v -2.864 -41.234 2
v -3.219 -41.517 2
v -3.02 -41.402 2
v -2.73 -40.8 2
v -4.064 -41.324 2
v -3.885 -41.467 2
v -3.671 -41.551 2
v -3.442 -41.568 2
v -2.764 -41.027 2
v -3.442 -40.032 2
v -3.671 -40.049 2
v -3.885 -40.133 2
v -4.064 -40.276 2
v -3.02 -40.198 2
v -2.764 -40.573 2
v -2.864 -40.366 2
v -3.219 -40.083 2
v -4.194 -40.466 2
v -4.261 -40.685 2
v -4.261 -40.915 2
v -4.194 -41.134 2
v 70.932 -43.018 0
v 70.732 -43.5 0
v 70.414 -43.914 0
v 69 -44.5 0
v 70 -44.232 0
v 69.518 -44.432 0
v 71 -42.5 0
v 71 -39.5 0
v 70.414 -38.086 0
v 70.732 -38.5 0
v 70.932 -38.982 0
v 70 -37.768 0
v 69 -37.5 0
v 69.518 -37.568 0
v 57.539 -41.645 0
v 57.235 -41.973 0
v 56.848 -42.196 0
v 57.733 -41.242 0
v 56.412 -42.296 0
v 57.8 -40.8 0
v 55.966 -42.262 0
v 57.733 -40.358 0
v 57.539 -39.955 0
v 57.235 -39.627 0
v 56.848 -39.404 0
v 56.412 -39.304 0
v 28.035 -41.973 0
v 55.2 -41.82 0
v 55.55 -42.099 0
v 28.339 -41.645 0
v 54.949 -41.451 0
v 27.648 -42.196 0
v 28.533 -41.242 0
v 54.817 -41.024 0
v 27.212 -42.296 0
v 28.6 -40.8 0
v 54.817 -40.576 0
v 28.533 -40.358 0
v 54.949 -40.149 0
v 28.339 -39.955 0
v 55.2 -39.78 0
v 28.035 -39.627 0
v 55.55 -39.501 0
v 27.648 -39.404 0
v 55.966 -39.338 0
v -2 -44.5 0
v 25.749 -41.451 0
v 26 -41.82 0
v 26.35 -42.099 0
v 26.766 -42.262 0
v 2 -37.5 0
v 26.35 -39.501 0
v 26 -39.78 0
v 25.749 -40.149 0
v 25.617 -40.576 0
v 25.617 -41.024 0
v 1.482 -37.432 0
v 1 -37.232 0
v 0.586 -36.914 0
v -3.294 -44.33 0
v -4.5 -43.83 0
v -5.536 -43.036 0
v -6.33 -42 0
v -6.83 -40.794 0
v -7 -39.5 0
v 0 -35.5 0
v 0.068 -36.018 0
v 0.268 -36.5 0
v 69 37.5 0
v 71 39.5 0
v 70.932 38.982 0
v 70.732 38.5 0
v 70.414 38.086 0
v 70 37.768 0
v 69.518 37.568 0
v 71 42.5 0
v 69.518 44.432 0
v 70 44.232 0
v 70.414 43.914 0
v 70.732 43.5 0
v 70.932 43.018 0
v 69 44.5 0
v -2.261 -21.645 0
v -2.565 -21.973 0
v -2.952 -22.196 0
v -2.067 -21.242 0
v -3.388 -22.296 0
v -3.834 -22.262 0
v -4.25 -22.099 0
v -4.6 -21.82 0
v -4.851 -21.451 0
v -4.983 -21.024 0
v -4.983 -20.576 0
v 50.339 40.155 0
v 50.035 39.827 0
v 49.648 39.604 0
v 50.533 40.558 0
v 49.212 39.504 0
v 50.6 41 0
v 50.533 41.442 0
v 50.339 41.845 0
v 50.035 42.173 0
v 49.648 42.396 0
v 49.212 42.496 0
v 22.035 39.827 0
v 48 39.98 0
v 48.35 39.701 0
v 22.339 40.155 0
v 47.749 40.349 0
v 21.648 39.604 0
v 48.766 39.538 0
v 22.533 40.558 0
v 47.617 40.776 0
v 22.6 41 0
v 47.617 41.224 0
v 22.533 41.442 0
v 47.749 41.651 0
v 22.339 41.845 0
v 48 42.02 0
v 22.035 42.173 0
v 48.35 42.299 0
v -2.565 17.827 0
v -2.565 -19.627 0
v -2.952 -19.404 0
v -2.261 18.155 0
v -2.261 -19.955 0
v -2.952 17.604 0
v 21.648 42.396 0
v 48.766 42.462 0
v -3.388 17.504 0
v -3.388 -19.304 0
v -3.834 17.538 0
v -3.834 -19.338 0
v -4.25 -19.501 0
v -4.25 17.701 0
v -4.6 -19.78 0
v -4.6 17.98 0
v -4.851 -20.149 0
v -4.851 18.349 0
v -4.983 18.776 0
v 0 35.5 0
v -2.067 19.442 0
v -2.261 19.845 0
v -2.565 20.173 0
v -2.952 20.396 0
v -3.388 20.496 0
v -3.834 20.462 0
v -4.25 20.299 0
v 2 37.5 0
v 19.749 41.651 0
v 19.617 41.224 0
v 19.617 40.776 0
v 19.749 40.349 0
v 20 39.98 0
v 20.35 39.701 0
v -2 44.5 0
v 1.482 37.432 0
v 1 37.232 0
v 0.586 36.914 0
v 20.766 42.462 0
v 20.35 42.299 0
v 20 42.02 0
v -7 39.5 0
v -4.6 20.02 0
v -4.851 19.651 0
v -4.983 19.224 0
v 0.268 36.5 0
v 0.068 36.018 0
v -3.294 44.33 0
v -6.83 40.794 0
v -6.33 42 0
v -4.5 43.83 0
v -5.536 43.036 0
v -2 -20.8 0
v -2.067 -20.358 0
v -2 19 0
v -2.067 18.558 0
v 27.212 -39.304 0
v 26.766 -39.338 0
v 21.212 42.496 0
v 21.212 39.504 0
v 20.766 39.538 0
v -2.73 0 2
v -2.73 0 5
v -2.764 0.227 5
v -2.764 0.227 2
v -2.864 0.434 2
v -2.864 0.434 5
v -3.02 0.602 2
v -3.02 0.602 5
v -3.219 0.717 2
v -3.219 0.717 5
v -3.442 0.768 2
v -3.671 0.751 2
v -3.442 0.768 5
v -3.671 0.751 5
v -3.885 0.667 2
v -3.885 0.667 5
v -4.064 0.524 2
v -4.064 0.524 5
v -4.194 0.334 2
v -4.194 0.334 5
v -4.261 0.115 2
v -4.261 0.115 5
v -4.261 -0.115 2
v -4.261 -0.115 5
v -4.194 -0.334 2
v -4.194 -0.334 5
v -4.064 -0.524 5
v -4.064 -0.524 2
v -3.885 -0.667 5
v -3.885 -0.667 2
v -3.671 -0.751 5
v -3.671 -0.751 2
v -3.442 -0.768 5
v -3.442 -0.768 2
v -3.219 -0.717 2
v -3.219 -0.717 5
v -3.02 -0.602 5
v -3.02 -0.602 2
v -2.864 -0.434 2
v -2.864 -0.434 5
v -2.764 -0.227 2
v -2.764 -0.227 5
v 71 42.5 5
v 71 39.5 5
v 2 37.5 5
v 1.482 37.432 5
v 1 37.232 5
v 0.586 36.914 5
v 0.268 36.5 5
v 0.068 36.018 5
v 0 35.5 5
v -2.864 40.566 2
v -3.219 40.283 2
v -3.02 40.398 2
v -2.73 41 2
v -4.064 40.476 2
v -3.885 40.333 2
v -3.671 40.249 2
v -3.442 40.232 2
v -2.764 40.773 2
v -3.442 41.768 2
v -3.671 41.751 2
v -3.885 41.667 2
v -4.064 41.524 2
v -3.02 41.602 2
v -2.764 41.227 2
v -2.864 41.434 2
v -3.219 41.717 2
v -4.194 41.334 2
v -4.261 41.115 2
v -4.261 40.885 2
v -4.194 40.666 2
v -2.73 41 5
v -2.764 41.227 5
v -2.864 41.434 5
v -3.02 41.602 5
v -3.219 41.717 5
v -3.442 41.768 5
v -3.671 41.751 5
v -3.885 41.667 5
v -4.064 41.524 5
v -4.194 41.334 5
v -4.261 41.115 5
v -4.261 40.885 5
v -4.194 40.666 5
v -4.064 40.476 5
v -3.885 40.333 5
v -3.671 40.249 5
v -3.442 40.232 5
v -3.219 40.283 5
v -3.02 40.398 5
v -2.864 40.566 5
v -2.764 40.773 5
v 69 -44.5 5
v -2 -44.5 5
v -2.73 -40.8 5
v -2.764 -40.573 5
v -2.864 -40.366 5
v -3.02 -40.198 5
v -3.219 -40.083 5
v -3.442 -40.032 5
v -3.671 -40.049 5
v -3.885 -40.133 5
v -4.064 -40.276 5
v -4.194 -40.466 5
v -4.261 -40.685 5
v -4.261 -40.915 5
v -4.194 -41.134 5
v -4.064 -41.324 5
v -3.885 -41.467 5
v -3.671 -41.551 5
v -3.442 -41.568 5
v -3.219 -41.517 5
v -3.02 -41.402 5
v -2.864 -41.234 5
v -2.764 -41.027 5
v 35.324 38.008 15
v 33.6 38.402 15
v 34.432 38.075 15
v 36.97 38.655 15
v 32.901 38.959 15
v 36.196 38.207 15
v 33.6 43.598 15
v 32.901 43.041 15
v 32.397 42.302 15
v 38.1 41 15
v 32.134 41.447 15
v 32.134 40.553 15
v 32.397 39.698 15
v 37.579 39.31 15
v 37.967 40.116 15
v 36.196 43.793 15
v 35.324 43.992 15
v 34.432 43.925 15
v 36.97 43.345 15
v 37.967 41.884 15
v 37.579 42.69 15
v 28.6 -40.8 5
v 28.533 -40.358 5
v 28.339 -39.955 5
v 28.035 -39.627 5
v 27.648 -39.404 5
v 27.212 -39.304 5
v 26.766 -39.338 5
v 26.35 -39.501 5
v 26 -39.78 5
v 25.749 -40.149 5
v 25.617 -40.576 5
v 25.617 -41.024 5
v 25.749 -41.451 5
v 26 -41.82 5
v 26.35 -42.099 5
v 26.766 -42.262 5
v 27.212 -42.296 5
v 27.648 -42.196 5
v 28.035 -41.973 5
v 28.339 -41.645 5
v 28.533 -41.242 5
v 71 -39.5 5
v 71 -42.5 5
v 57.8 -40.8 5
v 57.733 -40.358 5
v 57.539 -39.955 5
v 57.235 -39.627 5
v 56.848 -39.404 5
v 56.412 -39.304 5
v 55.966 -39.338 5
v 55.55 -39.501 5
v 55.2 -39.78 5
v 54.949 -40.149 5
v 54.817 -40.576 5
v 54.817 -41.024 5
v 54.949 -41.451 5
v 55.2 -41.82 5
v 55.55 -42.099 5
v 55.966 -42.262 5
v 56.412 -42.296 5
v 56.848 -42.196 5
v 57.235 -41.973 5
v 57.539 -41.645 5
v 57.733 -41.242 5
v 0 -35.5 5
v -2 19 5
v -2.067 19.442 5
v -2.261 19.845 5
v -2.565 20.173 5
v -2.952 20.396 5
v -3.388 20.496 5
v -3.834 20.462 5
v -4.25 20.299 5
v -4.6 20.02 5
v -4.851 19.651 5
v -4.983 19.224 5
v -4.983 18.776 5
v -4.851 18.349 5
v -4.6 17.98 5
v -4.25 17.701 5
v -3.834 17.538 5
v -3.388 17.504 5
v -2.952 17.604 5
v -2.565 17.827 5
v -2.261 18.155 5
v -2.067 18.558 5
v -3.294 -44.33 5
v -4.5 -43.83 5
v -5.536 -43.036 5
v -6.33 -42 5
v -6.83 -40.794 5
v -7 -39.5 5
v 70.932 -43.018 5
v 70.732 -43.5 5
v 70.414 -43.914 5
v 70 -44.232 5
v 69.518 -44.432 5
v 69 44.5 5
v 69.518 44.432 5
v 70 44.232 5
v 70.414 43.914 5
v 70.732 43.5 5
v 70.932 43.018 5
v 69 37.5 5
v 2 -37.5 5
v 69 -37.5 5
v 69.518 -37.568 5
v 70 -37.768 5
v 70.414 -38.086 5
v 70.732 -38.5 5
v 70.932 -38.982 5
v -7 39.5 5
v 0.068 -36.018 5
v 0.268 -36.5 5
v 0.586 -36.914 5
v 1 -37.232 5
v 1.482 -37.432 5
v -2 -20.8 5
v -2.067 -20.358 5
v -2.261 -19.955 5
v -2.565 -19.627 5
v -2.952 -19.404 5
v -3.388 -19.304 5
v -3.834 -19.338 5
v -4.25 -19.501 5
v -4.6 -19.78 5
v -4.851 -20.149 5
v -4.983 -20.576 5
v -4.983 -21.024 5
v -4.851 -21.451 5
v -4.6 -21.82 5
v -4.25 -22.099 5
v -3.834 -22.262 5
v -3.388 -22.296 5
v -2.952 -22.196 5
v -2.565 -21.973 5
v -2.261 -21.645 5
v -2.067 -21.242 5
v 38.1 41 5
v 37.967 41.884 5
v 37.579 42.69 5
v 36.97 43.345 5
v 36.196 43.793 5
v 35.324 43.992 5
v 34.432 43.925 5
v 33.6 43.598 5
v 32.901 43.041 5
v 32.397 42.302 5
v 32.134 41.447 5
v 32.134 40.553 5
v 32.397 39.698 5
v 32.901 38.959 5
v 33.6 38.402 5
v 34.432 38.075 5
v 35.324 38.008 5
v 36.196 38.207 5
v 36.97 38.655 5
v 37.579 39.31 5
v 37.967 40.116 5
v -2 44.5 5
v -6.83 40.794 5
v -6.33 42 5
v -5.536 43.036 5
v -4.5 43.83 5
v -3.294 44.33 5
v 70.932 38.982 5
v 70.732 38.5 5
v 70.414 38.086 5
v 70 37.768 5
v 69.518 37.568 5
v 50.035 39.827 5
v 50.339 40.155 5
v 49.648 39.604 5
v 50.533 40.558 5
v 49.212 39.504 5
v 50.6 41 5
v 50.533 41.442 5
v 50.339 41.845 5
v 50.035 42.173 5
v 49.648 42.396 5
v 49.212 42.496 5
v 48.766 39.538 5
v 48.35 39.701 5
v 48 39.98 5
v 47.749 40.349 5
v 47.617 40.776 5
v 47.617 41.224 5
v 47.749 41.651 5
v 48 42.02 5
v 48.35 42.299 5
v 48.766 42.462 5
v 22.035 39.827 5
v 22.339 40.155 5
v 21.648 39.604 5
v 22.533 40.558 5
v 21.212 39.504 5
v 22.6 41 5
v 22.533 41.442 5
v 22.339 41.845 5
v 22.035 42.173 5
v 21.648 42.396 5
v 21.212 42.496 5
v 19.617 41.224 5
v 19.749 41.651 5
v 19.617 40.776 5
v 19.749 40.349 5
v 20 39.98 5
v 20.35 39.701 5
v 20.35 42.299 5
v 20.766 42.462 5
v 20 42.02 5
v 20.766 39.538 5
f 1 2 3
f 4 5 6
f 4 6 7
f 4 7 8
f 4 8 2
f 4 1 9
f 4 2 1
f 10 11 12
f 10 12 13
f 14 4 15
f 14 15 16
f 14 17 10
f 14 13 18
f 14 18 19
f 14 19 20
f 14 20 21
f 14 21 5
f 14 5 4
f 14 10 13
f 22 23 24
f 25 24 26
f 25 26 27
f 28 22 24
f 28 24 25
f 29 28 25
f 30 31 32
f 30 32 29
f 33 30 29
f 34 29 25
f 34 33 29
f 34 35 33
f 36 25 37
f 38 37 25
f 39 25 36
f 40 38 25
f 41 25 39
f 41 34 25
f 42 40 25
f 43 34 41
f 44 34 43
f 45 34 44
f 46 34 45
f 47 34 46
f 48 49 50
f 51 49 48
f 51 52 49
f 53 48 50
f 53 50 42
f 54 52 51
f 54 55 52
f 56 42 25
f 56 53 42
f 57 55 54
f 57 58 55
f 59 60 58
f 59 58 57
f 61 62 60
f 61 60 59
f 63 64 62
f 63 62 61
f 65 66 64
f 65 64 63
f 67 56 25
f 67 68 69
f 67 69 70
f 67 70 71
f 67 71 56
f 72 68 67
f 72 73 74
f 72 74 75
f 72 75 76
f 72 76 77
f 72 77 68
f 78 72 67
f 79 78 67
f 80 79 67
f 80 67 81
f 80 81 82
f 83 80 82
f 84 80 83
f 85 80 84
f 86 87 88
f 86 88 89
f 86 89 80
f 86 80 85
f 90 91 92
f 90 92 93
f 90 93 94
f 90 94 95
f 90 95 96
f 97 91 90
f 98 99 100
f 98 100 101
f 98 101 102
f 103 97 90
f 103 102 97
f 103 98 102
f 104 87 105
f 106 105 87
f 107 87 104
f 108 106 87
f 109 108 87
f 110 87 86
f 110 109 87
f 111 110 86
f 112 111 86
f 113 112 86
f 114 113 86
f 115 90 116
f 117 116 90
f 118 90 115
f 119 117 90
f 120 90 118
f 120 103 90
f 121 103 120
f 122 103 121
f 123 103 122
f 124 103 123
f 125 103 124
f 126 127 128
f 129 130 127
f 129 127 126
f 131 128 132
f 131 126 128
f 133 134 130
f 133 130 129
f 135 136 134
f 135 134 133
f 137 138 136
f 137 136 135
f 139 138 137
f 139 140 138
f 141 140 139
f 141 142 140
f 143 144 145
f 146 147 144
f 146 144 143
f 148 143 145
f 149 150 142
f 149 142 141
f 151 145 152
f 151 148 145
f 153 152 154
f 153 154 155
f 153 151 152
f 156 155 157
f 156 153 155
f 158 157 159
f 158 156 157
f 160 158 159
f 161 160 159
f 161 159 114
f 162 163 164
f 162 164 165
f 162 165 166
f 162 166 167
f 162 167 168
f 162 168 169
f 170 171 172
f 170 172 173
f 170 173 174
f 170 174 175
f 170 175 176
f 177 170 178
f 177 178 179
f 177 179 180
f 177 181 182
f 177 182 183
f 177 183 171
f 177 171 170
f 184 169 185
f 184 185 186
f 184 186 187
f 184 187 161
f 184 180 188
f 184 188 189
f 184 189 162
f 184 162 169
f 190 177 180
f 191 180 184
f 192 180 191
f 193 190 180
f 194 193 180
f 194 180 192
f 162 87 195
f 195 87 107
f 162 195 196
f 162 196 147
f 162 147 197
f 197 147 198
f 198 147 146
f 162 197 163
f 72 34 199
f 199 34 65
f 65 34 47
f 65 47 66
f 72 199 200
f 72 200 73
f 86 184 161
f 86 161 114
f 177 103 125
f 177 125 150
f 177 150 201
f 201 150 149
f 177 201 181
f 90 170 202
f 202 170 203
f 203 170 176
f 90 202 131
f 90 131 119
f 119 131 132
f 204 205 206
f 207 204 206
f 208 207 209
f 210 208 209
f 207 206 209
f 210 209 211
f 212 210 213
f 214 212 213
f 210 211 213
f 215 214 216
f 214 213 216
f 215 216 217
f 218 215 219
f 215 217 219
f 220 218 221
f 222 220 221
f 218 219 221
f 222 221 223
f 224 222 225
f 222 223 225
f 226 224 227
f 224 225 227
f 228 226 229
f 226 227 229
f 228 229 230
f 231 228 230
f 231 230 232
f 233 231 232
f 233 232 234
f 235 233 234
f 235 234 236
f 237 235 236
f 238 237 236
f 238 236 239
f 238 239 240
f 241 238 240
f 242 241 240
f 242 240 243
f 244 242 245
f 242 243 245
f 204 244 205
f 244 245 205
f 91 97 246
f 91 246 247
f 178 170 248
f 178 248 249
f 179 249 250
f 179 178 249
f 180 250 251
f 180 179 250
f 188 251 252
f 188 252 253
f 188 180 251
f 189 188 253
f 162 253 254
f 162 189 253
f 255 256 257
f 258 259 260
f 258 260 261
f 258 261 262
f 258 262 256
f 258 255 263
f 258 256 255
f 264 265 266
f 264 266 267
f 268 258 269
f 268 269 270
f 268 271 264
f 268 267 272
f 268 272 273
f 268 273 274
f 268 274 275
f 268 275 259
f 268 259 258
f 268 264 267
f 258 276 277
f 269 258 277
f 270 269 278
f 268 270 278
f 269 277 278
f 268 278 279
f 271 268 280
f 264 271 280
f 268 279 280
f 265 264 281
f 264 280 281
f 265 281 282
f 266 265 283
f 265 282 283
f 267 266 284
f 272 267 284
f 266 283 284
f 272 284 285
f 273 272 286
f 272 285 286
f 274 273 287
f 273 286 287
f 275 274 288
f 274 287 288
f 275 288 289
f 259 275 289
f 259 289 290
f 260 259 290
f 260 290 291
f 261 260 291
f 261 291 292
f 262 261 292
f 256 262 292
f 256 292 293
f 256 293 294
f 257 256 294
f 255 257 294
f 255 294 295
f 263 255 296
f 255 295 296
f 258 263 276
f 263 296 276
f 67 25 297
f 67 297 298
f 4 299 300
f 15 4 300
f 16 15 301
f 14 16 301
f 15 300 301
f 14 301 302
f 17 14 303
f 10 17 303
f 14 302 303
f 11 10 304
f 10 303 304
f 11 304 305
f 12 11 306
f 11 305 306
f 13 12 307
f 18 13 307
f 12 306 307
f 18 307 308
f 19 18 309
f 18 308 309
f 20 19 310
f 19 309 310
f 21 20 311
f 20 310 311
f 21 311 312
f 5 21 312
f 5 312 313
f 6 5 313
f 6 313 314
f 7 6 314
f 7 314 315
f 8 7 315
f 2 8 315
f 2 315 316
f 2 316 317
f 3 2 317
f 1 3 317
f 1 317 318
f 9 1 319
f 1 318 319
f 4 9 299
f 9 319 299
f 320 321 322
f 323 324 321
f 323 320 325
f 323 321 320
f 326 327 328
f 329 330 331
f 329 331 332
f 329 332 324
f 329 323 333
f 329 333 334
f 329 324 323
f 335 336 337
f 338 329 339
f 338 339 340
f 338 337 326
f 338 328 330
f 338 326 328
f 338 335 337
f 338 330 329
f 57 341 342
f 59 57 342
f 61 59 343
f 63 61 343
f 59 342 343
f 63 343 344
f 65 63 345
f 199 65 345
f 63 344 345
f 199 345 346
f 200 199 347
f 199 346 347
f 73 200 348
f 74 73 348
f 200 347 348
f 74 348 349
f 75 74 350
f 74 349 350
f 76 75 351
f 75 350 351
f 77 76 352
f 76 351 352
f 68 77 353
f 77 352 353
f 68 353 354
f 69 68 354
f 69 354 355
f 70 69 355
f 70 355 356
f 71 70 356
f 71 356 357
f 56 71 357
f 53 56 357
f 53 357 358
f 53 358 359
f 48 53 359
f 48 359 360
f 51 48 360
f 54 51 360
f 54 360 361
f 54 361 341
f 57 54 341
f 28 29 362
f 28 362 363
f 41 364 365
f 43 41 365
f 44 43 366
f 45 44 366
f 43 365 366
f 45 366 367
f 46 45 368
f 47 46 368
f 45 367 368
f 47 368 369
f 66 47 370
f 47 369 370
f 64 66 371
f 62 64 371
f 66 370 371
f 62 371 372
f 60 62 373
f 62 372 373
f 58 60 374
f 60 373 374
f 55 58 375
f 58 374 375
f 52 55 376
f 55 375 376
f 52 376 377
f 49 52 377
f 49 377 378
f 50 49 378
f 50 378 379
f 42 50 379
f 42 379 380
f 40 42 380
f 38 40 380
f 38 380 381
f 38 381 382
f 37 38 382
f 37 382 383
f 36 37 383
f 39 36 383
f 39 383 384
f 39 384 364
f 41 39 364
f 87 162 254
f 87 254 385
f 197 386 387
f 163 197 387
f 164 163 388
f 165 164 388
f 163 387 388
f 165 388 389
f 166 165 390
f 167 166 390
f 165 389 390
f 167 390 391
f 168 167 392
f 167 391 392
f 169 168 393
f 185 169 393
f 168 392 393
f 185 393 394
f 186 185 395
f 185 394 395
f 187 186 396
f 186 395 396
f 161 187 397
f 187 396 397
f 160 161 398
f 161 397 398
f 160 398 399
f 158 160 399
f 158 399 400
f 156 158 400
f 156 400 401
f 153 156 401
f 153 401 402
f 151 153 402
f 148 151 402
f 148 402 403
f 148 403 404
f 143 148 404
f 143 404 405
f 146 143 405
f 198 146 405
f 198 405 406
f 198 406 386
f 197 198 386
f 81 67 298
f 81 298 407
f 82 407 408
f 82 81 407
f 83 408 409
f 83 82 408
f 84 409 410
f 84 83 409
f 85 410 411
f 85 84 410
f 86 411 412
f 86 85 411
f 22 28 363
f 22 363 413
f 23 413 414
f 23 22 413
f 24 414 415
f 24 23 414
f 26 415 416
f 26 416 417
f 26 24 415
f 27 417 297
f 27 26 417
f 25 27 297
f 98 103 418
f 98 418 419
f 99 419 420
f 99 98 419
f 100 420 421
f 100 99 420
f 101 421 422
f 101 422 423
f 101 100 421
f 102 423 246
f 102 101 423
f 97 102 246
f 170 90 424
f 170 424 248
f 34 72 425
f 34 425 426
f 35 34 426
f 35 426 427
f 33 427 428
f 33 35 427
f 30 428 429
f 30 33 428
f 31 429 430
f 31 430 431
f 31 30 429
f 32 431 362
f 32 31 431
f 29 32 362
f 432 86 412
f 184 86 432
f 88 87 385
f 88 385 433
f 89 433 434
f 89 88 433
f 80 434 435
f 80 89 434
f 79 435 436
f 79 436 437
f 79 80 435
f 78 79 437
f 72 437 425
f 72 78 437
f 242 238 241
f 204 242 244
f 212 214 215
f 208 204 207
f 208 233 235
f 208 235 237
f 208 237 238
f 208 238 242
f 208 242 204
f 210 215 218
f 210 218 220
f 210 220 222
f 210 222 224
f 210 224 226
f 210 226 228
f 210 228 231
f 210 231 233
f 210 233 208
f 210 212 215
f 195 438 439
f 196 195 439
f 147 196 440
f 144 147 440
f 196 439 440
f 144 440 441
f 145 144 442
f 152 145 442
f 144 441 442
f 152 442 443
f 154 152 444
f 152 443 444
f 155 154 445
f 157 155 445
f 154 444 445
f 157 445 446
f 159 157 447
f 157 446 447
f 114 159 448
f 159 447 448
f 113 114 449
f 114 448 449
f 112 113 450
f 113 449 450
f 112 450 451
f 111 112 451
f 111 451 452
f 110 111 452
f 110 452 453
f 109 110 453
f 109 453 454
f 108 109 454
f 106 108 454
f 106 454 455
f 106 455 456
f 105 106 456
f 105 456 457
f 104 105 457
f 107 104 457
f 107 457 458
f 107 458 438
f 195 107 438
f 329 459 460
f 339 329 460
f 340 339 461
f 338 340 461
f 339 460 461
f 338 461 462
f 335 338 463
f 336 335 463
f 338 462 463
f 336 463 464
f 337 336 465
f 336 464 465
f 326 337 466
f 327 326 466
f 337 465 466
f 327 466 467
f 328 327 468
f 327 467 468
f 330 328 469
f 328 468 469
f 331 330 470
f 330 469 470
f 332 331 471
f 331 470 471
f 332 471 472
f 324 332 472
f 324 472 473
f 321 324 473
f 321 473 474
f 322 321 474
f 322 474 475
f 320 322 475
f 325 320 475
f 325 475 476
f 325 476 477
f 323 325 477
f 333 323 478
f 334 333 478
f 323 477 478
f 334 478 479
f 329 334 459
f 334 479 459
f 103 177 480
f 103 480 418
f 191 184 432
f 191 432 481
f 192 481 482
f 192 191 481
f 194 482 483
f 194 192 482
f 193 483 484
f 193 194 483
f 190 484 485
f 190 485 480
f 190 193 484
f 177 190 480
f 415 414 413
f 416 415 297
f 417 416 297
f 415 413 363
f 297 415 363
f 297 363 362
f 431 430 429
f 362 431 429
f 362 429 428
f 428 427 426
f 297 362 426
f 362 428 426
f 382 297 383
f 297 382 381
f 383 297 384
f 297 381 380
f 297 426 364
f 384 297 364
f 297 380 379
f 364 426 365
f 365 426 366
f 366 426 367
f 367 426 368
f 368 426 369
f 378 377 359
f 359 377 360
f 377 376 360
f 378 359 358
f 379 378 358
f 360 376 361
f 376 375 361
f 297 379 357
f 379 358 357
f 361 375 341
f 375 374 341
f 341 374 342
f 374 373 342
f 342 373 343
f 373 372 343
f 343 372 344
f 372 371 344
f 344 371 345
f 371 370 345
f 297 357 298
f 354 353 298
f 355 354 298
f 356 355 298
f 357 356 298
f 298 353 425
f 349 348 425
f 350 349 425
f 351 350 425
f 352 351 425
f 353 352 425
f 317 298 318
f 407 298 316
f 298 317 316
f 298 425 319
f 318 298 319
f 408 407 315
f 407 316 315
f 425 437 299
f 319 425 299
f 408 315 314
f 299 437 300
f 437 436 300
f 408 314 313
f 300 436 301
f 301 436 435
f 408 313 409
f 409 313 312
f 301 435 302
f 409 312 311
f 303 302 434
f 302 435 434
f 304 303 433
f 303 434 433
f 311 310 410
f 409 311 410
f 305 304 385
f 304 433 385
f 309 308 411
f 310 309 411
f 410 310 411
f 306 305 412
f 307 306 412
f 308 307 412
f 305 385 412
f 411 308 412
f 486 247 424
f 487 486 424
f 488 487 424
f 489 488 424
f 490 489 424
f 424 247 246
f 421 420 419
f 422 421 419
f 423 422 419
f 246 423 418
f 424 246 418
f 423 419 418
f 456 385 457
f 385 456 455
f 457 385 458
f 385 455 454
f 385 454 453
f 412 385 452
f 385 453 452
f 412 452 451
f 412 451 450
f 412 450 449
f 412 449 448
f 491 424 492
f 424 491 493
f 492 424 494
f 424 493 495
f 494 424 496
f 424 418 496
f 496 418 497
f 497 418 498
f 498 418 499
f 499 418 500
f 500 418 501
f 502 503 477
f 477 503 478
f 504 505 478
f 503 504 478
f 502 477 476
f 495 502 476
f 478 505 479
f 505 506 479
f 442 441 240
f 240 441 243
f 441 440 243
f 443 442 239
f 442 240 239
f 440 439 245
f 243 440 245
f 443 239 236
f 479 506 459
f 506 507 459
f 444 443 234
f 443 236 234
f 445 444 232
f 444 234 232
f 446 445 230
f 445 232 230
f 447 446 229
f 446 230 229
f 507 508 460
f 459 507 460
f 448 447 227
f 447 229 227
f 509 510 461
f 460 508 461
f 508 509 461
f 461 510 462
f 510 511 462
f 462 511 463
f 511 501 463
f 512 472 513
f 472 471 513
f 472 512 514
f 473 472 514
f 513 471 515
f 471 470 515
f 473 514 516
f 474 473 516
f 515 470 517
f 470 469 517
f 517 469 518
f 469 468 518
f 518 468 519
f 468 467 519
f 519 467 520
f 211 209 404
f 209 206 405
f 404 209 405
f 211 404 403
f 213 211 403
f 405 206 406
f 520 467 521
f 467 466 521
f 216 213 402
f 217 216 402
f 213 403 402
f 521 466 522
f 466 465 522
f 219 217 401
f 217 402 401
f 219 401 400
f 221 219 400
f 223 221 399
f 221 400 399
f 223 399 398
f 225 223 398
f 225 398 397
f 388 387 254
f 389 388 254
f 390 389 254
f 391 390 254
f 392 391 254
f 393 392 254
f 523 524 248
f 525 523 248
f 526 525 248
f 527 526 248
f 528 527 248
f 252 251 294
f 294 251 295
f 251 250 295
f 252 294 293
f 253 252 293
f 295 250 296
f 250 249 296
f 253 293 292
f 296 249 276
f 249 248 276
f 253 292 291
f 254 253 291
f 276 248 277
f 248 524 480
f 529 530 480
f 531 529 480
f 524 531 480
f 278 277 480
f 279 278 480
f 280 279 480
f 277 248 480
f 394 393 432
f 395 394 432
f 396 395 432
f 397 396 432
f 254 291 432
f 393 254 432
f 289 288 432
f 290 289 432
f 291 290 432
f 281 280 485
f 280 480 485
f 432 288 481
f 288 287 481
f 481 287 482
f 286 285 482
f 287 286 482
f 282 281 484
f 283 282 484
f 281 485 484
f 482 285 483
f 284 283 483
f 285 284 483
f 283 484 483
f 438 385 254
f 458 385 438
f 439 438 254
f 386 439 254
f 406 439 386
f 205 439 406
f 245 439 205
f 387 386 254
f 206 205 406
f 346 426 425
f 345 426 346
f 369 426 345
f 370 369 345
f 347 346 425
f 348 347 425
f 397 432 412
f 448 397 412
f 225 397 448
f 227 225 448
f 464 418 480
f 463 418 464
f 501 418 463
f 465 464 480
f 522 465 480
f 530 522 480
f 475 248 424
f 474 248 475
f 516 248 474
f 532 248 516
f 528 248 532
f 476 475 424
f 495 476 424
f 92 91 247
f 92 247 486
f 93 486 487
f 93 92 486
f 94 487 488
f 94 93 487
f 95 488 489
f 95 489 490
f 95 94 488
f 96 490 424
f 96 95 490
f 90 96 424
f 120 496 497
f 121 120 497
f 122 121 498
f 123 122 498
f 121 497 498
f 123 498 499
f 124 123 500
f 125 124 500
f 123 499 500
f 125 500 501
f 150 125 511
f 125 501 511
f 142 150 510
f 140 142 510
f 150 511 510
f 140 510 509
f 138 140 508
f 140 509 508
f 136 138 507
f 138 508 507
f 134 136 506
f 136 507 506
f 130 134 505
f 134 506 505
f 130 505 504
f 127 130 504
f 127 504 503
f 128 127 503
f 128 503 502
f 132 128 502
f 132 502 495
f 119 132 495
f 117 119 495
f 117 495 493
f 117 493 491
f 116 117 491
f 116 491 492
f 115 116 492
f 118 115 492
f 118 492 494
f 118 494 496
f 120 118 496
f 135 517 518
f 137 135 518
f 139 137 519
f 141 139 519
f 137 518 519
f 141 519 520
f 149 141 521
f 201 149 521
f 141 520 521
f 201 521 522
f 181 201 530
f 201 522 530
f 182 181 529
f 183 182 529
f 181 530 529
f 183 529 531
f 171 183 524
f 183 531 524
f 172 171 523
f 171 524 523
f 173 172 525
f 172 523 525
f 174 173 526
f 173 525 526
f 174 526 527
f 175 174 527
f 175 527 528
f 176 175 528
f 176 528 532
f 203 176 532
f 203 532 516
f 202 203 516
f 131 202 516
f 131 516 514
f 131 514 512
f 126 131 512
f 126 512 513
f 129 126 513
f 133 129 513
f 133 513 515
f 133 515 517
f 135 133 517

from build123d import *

# Parameters (mm, degrees)
BOSS_EXTRUDE1_DEPTH = 5
SKETCH2_R           = 3
BOSS_EXTRUDE2_DEPTH = 10
SKETCH3_R           = 1.5
CUT_EXTRUDE1_DEPTH  = 6
SKETCH4_R           = 0.77
CUT_EXTRUDE2_DEPTH  = 3


with BuildPart() as part:
    # Sketch1 → Boss-Extrude1 (new body)
    with BuildSketch(Plane.XY):
        with BuildLine():
            Line((0, 35.5), (0, -35.5))
            ThreePointArc((0, -35.5), (0.585786438, -36.914213562), (2, -37.5))
            Line((2, -37.5), (69, -37.5))
            ThreePointArc((69, -37.5), (70.414213562, -38.085786438), (71, -39.5))
            Line((71, -39.5), (71, -42.5))
            ThreePointArc((71, -42.5), (70.414213562, -43.914213562), (69, -44.5))
            Line((69, -44.5), (-2, -44.5))
            ThreePointArc((-2, -44.5), (-5.535533906, -43.035533906), (-7, -39.5))
            Line((-7, -39.5), (-7, 39.5))
            ThreePointArc((-7, 39.5), (-5.535533906, 43.035533906), (-2, 44.5))
            Line((-2, 44.5), (69, 44.5))
            ThreePointArc((69, 44.5), (70.414213562, 43.914213562), (71, 42.5))
            Line((71, 42.5), (71, 39.5))
            ThreePointArc((71, 39.5), (70.414213562, 38.085786438), (69, 37.5))
            Line((69, 37.5), (2, 37.5))
            ThreePointArc((2, 37.5), (0.585786438, 36.914213562), (0, 35.5))
        make_face()
    extrude(amount=BOSS_EXTRUDE1_DEPTH)

    # Sketch2 → Boss-Extrude2 (add)
    with BuildSketch(Plane.XY.offset(5)):
        with Locations((35.1, 41)):
            Circle(SKETCH2_R)
    extrude(amount=BOSS_EXTRUDE2_DEPTH)

    # Sketch3 → Cut-Extrude1 (cut, through all)
    with BuildSketch(Plane.XY.offset(5)):
        with Locations((49.1, 41)):
            Circle(SKETCH3_R)
        with Locations((21.1, 41)):
            Circle(SKETCH3_R)
        with Locations((-3.5, 19)):
            Circle(SKETCH3_R)
        with Locations((-3.5, -20.8)):
            Circle(SKETCH3_R)
        with Locations((27.1, -40.8)):
            Circle(SKETCH3_R)
        with Locations((56.3, -40.8)):
            Circle(SKETCH3_R)
    extrude(amount=-CUT_EXTRUDE1_DEPTH, mode=Mode.SUBTRACT)

    # Sketch4 → Cut-Extrude2 (cut)
    with BuildSketch(Plane.XY.offset(5)):
        with Locations((-3.5, 0)):
            Circle(SKETCH4_R)
        with Locations((-3.5, 41)):
            Circle(SKETCH4_R)
        with Locations((-3.5, -40.8)):
            Circle(SKETCH4_R)
    extrude(amount=-CUT_EXTRUDE2_DEPTH, mode=Mode.SUBTRACT)


solid = part.part
